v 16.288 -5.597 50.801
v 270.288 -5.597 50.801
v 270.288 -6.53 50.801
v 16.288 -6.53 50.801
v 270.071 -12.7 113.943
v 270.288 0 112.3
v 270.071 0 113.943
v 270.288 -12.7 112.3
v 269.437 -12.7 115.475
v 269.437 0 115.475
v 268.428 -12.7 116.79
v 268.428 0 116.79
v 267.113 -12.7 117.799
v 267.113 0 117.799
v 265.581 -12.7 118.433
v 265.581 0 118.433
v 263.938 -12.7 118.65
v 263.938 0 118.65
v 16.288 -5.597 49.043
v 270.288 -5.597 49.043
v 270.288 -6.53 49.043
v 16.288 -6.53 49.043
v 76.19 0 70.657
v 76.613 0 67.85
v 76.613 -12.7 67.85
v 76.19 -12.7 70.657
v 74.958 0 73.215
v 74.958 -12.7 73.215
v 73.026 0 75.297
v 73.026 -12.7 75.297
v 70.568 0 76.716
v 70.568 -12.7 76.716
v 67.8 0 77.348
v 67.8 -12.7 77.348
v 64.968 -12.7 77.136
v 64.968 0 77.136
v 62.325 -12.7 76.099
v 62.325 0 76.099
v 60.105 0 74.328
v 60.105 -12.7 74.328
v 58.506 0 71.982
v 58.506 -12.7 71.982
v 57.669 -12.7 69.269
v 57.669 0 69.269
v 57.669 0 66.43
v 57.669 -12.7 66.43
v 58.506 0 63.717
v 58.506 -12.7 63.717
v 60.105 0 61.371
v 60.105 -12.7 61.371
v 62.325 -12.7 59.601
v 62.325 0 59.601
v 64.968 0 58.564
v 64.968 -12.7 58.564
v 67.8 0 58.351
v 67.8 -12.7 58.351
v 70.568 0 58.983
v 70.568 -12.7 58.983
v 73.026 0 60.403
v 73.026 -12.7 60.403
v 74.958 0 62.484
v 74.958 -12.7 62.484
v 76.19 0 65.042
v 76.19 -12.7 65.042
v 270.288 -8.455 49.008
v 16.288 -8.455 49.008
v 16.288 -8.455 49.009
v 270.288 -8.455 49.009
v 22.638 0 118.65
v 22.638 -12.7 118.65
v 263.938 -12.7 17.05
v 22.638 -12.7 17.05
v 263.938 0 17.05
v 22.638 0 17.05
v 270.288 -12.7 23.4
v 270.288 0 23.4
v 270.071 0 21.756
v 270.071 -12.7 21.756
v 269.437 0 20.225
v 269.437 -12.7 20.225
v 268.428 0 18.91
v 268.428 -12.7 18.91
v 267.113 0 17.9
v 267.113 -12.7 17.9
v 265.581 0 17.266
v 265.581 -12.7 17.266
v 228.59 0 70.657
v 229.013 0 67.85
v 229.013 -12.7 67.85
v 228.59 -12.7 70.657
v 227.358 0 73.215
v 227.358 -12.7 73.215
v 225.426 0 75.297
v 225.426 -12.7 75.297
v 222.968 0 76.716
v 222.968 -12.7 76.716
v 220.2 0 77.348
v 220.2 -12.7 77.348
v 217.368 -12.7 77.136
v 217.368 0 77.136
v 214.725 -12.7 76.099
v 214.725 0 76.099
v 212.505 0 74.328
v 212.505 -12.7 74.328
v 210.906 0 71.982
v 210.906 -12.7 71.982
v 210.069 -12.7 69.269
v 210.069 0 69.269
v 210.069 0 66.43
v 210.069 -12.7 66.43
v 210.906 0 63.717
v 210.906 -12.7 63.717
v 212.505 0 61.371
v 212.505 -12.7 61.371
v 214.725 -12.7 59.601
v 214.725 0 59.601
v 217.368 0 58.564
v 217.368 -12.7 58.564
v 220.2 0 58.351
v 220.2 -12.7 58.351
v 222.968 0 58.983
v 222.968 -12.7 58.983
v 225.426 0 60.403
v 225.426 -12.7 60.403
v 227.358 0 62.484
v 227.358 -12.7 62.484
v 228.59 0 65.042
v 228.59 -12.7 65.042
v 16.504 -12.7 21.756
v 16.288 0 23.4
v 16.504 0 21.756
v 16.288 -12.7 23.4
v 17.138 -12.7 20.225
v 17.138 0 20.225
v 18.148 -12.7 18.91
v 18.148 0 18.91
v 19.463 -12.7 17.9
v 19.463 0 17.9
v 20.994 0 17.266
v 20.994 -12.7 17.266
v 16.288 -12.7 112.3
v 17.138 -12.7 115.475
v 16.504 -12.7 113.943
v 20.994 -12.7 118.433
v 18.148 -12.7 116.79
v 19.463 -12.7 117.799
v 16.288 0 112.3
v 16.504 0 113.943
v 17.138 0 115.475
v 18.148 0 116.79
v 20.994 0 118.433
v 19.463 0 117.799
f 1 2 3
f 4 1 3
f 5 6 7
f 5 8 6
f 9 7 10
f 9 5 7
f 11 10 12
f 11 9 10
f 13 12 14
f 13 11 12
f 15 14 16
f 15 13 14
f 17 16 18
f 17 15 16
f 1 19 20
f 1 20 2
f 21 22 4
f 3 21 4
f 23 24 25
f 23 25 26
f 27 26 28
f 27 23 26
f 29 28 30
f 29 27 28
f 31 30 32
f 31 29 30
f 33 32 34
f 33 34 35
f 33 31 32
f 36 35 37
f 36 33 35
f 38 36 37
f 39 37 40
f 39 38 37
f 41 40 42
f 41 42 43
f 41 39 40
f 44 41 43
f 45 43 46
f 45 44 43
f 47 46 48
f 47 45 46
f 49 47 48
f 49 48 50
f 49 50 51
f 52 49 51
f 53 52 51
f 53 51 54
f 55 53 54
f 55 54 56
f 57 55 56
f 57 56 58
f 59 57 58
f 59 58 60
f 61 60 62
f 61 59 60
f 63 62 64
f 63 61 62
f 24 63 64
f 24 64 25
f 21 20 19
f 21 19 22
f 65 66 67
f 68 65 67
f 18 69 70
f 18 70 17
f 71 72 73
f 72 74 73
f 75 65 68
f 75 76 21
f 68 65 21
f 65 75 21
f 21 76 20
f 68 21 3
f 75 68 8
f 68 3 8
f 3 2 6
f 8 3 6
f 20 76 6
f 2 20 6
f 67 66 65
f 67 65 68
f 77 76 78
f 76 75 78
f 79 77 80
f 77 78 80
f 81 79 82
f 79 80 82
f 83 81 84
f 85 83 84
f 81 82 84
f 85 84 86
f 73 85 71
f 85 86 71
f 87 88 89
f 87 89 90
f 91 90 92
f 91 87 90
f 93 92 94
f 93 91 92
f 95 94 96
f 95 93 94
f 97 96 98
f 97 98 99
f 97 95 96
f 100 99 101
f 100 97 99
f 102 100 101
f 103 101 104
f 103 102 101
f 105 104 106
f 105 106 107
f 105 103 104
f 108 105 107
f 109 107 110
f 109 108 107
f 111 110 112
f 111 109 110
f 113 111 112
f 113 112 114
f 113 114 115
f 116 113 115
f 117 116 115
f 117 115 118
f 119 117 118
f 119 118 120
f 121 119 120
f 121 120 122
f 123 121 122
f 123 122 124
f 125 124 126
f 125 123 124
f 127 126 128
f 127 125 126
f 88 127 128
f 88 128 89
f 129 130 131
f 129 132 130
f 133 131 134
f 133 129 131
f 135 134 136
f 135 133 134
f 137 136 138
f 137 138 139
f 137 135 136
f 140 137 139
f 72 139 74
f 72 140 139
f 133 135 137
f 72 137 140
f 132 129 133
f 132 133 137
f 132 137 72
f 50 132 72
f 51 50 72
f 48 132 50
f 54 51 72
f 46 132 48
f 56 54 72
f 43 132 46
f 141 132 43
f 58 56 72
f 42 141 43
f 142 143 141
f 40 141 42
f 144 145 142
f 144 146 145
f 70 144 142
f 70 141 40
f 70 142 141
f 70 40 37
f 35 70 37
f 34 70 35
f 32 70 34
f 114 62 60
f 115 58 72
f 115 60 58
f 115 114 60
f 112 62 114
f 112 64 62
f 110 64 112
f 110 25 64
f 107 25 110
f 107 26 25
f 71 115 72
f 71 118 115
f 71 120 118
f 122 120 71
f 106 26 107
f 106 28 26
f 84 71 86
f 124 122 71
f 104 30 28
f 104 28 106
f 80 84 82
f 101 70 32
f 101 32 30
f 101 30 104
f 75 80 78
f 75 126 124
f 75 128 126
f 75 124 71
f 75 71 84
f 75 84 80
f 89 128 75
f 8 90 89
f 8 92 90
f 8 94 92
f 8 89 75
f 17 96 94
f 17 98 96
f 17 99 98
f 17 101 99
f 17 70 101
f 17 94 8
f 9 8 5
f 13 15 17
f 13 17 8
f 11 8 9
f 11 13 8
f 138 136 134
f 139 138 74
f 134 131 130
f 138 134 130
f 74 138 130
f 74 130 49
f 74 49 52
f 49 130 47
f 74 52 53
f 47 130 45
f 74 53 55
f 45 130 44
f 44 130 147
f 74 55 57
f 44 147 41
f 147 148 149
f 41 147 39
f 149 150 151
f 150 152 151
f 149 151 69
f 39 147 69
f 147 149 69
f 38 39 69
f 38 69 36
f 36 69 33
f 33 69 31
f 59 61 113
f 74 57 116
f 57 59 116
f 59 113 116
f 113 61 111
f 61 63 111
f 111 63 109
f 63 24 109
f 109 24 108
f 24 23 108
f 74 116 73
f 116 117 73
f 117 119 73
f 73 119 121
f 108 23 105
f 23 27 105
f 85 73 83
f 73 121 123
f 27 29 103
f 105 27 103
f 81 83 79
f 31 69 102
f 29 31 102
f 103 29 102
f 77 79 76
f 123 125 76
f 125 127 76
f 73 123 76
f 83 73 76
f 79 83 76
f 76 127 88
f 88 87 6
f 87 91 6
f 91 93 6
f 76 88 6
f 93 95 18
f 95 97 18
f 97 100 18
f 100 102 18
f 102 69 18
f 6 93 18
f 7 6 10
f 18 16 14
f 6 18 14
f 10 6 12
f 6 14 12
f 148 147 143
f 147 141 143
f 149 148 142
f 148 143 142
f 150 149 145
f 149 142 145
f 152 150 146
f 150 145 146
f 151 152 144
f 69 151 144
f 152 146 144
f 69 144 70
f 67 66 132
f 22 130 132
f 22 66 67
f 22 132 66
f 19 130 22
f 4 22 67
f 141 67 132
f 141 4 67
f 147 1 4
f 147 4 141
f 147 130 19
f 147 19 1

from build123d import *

# Parameters (mm, degrees)
F0_W     = 254
F0_H     = 101.6
F0_R     = 9.525
F1_DEPTH = 12.7
F2_R     = 6.35
F3_DEPTH = 12.7
F4_R     = 6.35
F5_W     = 0.9328643791
F5_H     = 1.7582587898
F5_W_2   = 0.0005662441
F5_H_2   = 0.0007078052
F6_DEPTH = 254.001


# Not quite as in the source:
# - a feature of the source that left no trace in its solid (it failed there, or was rolled back) is left out


with BuildPart() as f1:
    # F0 (on Front) → F1 (new body)
    with BuildSketch(Plane.XZ):
        with Locations((143.2877514958, 67.8497503132)):
            Rectangle(F0_W, F0_H)
        with Locations((67.0877514958, 67.8497503132)):
            Circle(F0_R, mode=Mode.SUBTRACT)
        with Locations((219.4877514958, 67.8497503132)):
            Circle(F0_R, mode=Mode.SUBTRACT)
    extrude(amount=F1_DEPTH)

    # F2
    f2_edges = [f1.edges().sort_by_distance(p)[0] for p in [
        (16.287751, -6.35, 118.64975),
        (16.287751, -6.35, 17.04975),
        (270.287751, -6.35, 118.64975),
        (270.287751, -6.35, 17.04975),
    ]]
    fillet(f2_edges, radius=F2_R)

    # F0 (on Front) → F3 (join)
    with BuildSketch(Plane.XZ):
        with Locations((143.2877514958, 67.8497503132)):
            Rectangle(F0_W, F0_H)
        with Locations((67.0877514958, 67.8497503132)):
            Circle(F0_R, mode=Mode.SUBTRACT)
        with Locations((219.4877514958, 67.8497503132)):
            Circle(F0_R, mode=Mode.SUBTRACT)
    extrude(amount=F3_DEPTH)

    # F4
    f4_edges = [f1.edges().sort_by_distance(p)[0] for p in [
        (270.287751, -6.35, 118.64975),
        (16.287751, -6.35, 118.64975),
        (270.287751, -6.35, 17.04975),
        (16.287751, -6.35, 17.04975),
    ]]
    fillet(f4_edges, radius=F4_R)

    # F5 (on face) → F6 (cut, through all)
    with BuildSketch(Plane(origin=(16.2877514958, 0, 0), x_dir=(0, -1, 0), z_dir=(-1, 0, 0))):
        with Locations((6.063854089, 49.9223377556)):
            Rectangle(F5_W, F5_H)
        with Locations((8.4549216554, 49.0087680519)):
            Rectangle(F5_W_2, F5_H_2)
    extrude(amount=-F6_DEPTH, mode=Mode.SUBTRACT)


solid = f1.part
